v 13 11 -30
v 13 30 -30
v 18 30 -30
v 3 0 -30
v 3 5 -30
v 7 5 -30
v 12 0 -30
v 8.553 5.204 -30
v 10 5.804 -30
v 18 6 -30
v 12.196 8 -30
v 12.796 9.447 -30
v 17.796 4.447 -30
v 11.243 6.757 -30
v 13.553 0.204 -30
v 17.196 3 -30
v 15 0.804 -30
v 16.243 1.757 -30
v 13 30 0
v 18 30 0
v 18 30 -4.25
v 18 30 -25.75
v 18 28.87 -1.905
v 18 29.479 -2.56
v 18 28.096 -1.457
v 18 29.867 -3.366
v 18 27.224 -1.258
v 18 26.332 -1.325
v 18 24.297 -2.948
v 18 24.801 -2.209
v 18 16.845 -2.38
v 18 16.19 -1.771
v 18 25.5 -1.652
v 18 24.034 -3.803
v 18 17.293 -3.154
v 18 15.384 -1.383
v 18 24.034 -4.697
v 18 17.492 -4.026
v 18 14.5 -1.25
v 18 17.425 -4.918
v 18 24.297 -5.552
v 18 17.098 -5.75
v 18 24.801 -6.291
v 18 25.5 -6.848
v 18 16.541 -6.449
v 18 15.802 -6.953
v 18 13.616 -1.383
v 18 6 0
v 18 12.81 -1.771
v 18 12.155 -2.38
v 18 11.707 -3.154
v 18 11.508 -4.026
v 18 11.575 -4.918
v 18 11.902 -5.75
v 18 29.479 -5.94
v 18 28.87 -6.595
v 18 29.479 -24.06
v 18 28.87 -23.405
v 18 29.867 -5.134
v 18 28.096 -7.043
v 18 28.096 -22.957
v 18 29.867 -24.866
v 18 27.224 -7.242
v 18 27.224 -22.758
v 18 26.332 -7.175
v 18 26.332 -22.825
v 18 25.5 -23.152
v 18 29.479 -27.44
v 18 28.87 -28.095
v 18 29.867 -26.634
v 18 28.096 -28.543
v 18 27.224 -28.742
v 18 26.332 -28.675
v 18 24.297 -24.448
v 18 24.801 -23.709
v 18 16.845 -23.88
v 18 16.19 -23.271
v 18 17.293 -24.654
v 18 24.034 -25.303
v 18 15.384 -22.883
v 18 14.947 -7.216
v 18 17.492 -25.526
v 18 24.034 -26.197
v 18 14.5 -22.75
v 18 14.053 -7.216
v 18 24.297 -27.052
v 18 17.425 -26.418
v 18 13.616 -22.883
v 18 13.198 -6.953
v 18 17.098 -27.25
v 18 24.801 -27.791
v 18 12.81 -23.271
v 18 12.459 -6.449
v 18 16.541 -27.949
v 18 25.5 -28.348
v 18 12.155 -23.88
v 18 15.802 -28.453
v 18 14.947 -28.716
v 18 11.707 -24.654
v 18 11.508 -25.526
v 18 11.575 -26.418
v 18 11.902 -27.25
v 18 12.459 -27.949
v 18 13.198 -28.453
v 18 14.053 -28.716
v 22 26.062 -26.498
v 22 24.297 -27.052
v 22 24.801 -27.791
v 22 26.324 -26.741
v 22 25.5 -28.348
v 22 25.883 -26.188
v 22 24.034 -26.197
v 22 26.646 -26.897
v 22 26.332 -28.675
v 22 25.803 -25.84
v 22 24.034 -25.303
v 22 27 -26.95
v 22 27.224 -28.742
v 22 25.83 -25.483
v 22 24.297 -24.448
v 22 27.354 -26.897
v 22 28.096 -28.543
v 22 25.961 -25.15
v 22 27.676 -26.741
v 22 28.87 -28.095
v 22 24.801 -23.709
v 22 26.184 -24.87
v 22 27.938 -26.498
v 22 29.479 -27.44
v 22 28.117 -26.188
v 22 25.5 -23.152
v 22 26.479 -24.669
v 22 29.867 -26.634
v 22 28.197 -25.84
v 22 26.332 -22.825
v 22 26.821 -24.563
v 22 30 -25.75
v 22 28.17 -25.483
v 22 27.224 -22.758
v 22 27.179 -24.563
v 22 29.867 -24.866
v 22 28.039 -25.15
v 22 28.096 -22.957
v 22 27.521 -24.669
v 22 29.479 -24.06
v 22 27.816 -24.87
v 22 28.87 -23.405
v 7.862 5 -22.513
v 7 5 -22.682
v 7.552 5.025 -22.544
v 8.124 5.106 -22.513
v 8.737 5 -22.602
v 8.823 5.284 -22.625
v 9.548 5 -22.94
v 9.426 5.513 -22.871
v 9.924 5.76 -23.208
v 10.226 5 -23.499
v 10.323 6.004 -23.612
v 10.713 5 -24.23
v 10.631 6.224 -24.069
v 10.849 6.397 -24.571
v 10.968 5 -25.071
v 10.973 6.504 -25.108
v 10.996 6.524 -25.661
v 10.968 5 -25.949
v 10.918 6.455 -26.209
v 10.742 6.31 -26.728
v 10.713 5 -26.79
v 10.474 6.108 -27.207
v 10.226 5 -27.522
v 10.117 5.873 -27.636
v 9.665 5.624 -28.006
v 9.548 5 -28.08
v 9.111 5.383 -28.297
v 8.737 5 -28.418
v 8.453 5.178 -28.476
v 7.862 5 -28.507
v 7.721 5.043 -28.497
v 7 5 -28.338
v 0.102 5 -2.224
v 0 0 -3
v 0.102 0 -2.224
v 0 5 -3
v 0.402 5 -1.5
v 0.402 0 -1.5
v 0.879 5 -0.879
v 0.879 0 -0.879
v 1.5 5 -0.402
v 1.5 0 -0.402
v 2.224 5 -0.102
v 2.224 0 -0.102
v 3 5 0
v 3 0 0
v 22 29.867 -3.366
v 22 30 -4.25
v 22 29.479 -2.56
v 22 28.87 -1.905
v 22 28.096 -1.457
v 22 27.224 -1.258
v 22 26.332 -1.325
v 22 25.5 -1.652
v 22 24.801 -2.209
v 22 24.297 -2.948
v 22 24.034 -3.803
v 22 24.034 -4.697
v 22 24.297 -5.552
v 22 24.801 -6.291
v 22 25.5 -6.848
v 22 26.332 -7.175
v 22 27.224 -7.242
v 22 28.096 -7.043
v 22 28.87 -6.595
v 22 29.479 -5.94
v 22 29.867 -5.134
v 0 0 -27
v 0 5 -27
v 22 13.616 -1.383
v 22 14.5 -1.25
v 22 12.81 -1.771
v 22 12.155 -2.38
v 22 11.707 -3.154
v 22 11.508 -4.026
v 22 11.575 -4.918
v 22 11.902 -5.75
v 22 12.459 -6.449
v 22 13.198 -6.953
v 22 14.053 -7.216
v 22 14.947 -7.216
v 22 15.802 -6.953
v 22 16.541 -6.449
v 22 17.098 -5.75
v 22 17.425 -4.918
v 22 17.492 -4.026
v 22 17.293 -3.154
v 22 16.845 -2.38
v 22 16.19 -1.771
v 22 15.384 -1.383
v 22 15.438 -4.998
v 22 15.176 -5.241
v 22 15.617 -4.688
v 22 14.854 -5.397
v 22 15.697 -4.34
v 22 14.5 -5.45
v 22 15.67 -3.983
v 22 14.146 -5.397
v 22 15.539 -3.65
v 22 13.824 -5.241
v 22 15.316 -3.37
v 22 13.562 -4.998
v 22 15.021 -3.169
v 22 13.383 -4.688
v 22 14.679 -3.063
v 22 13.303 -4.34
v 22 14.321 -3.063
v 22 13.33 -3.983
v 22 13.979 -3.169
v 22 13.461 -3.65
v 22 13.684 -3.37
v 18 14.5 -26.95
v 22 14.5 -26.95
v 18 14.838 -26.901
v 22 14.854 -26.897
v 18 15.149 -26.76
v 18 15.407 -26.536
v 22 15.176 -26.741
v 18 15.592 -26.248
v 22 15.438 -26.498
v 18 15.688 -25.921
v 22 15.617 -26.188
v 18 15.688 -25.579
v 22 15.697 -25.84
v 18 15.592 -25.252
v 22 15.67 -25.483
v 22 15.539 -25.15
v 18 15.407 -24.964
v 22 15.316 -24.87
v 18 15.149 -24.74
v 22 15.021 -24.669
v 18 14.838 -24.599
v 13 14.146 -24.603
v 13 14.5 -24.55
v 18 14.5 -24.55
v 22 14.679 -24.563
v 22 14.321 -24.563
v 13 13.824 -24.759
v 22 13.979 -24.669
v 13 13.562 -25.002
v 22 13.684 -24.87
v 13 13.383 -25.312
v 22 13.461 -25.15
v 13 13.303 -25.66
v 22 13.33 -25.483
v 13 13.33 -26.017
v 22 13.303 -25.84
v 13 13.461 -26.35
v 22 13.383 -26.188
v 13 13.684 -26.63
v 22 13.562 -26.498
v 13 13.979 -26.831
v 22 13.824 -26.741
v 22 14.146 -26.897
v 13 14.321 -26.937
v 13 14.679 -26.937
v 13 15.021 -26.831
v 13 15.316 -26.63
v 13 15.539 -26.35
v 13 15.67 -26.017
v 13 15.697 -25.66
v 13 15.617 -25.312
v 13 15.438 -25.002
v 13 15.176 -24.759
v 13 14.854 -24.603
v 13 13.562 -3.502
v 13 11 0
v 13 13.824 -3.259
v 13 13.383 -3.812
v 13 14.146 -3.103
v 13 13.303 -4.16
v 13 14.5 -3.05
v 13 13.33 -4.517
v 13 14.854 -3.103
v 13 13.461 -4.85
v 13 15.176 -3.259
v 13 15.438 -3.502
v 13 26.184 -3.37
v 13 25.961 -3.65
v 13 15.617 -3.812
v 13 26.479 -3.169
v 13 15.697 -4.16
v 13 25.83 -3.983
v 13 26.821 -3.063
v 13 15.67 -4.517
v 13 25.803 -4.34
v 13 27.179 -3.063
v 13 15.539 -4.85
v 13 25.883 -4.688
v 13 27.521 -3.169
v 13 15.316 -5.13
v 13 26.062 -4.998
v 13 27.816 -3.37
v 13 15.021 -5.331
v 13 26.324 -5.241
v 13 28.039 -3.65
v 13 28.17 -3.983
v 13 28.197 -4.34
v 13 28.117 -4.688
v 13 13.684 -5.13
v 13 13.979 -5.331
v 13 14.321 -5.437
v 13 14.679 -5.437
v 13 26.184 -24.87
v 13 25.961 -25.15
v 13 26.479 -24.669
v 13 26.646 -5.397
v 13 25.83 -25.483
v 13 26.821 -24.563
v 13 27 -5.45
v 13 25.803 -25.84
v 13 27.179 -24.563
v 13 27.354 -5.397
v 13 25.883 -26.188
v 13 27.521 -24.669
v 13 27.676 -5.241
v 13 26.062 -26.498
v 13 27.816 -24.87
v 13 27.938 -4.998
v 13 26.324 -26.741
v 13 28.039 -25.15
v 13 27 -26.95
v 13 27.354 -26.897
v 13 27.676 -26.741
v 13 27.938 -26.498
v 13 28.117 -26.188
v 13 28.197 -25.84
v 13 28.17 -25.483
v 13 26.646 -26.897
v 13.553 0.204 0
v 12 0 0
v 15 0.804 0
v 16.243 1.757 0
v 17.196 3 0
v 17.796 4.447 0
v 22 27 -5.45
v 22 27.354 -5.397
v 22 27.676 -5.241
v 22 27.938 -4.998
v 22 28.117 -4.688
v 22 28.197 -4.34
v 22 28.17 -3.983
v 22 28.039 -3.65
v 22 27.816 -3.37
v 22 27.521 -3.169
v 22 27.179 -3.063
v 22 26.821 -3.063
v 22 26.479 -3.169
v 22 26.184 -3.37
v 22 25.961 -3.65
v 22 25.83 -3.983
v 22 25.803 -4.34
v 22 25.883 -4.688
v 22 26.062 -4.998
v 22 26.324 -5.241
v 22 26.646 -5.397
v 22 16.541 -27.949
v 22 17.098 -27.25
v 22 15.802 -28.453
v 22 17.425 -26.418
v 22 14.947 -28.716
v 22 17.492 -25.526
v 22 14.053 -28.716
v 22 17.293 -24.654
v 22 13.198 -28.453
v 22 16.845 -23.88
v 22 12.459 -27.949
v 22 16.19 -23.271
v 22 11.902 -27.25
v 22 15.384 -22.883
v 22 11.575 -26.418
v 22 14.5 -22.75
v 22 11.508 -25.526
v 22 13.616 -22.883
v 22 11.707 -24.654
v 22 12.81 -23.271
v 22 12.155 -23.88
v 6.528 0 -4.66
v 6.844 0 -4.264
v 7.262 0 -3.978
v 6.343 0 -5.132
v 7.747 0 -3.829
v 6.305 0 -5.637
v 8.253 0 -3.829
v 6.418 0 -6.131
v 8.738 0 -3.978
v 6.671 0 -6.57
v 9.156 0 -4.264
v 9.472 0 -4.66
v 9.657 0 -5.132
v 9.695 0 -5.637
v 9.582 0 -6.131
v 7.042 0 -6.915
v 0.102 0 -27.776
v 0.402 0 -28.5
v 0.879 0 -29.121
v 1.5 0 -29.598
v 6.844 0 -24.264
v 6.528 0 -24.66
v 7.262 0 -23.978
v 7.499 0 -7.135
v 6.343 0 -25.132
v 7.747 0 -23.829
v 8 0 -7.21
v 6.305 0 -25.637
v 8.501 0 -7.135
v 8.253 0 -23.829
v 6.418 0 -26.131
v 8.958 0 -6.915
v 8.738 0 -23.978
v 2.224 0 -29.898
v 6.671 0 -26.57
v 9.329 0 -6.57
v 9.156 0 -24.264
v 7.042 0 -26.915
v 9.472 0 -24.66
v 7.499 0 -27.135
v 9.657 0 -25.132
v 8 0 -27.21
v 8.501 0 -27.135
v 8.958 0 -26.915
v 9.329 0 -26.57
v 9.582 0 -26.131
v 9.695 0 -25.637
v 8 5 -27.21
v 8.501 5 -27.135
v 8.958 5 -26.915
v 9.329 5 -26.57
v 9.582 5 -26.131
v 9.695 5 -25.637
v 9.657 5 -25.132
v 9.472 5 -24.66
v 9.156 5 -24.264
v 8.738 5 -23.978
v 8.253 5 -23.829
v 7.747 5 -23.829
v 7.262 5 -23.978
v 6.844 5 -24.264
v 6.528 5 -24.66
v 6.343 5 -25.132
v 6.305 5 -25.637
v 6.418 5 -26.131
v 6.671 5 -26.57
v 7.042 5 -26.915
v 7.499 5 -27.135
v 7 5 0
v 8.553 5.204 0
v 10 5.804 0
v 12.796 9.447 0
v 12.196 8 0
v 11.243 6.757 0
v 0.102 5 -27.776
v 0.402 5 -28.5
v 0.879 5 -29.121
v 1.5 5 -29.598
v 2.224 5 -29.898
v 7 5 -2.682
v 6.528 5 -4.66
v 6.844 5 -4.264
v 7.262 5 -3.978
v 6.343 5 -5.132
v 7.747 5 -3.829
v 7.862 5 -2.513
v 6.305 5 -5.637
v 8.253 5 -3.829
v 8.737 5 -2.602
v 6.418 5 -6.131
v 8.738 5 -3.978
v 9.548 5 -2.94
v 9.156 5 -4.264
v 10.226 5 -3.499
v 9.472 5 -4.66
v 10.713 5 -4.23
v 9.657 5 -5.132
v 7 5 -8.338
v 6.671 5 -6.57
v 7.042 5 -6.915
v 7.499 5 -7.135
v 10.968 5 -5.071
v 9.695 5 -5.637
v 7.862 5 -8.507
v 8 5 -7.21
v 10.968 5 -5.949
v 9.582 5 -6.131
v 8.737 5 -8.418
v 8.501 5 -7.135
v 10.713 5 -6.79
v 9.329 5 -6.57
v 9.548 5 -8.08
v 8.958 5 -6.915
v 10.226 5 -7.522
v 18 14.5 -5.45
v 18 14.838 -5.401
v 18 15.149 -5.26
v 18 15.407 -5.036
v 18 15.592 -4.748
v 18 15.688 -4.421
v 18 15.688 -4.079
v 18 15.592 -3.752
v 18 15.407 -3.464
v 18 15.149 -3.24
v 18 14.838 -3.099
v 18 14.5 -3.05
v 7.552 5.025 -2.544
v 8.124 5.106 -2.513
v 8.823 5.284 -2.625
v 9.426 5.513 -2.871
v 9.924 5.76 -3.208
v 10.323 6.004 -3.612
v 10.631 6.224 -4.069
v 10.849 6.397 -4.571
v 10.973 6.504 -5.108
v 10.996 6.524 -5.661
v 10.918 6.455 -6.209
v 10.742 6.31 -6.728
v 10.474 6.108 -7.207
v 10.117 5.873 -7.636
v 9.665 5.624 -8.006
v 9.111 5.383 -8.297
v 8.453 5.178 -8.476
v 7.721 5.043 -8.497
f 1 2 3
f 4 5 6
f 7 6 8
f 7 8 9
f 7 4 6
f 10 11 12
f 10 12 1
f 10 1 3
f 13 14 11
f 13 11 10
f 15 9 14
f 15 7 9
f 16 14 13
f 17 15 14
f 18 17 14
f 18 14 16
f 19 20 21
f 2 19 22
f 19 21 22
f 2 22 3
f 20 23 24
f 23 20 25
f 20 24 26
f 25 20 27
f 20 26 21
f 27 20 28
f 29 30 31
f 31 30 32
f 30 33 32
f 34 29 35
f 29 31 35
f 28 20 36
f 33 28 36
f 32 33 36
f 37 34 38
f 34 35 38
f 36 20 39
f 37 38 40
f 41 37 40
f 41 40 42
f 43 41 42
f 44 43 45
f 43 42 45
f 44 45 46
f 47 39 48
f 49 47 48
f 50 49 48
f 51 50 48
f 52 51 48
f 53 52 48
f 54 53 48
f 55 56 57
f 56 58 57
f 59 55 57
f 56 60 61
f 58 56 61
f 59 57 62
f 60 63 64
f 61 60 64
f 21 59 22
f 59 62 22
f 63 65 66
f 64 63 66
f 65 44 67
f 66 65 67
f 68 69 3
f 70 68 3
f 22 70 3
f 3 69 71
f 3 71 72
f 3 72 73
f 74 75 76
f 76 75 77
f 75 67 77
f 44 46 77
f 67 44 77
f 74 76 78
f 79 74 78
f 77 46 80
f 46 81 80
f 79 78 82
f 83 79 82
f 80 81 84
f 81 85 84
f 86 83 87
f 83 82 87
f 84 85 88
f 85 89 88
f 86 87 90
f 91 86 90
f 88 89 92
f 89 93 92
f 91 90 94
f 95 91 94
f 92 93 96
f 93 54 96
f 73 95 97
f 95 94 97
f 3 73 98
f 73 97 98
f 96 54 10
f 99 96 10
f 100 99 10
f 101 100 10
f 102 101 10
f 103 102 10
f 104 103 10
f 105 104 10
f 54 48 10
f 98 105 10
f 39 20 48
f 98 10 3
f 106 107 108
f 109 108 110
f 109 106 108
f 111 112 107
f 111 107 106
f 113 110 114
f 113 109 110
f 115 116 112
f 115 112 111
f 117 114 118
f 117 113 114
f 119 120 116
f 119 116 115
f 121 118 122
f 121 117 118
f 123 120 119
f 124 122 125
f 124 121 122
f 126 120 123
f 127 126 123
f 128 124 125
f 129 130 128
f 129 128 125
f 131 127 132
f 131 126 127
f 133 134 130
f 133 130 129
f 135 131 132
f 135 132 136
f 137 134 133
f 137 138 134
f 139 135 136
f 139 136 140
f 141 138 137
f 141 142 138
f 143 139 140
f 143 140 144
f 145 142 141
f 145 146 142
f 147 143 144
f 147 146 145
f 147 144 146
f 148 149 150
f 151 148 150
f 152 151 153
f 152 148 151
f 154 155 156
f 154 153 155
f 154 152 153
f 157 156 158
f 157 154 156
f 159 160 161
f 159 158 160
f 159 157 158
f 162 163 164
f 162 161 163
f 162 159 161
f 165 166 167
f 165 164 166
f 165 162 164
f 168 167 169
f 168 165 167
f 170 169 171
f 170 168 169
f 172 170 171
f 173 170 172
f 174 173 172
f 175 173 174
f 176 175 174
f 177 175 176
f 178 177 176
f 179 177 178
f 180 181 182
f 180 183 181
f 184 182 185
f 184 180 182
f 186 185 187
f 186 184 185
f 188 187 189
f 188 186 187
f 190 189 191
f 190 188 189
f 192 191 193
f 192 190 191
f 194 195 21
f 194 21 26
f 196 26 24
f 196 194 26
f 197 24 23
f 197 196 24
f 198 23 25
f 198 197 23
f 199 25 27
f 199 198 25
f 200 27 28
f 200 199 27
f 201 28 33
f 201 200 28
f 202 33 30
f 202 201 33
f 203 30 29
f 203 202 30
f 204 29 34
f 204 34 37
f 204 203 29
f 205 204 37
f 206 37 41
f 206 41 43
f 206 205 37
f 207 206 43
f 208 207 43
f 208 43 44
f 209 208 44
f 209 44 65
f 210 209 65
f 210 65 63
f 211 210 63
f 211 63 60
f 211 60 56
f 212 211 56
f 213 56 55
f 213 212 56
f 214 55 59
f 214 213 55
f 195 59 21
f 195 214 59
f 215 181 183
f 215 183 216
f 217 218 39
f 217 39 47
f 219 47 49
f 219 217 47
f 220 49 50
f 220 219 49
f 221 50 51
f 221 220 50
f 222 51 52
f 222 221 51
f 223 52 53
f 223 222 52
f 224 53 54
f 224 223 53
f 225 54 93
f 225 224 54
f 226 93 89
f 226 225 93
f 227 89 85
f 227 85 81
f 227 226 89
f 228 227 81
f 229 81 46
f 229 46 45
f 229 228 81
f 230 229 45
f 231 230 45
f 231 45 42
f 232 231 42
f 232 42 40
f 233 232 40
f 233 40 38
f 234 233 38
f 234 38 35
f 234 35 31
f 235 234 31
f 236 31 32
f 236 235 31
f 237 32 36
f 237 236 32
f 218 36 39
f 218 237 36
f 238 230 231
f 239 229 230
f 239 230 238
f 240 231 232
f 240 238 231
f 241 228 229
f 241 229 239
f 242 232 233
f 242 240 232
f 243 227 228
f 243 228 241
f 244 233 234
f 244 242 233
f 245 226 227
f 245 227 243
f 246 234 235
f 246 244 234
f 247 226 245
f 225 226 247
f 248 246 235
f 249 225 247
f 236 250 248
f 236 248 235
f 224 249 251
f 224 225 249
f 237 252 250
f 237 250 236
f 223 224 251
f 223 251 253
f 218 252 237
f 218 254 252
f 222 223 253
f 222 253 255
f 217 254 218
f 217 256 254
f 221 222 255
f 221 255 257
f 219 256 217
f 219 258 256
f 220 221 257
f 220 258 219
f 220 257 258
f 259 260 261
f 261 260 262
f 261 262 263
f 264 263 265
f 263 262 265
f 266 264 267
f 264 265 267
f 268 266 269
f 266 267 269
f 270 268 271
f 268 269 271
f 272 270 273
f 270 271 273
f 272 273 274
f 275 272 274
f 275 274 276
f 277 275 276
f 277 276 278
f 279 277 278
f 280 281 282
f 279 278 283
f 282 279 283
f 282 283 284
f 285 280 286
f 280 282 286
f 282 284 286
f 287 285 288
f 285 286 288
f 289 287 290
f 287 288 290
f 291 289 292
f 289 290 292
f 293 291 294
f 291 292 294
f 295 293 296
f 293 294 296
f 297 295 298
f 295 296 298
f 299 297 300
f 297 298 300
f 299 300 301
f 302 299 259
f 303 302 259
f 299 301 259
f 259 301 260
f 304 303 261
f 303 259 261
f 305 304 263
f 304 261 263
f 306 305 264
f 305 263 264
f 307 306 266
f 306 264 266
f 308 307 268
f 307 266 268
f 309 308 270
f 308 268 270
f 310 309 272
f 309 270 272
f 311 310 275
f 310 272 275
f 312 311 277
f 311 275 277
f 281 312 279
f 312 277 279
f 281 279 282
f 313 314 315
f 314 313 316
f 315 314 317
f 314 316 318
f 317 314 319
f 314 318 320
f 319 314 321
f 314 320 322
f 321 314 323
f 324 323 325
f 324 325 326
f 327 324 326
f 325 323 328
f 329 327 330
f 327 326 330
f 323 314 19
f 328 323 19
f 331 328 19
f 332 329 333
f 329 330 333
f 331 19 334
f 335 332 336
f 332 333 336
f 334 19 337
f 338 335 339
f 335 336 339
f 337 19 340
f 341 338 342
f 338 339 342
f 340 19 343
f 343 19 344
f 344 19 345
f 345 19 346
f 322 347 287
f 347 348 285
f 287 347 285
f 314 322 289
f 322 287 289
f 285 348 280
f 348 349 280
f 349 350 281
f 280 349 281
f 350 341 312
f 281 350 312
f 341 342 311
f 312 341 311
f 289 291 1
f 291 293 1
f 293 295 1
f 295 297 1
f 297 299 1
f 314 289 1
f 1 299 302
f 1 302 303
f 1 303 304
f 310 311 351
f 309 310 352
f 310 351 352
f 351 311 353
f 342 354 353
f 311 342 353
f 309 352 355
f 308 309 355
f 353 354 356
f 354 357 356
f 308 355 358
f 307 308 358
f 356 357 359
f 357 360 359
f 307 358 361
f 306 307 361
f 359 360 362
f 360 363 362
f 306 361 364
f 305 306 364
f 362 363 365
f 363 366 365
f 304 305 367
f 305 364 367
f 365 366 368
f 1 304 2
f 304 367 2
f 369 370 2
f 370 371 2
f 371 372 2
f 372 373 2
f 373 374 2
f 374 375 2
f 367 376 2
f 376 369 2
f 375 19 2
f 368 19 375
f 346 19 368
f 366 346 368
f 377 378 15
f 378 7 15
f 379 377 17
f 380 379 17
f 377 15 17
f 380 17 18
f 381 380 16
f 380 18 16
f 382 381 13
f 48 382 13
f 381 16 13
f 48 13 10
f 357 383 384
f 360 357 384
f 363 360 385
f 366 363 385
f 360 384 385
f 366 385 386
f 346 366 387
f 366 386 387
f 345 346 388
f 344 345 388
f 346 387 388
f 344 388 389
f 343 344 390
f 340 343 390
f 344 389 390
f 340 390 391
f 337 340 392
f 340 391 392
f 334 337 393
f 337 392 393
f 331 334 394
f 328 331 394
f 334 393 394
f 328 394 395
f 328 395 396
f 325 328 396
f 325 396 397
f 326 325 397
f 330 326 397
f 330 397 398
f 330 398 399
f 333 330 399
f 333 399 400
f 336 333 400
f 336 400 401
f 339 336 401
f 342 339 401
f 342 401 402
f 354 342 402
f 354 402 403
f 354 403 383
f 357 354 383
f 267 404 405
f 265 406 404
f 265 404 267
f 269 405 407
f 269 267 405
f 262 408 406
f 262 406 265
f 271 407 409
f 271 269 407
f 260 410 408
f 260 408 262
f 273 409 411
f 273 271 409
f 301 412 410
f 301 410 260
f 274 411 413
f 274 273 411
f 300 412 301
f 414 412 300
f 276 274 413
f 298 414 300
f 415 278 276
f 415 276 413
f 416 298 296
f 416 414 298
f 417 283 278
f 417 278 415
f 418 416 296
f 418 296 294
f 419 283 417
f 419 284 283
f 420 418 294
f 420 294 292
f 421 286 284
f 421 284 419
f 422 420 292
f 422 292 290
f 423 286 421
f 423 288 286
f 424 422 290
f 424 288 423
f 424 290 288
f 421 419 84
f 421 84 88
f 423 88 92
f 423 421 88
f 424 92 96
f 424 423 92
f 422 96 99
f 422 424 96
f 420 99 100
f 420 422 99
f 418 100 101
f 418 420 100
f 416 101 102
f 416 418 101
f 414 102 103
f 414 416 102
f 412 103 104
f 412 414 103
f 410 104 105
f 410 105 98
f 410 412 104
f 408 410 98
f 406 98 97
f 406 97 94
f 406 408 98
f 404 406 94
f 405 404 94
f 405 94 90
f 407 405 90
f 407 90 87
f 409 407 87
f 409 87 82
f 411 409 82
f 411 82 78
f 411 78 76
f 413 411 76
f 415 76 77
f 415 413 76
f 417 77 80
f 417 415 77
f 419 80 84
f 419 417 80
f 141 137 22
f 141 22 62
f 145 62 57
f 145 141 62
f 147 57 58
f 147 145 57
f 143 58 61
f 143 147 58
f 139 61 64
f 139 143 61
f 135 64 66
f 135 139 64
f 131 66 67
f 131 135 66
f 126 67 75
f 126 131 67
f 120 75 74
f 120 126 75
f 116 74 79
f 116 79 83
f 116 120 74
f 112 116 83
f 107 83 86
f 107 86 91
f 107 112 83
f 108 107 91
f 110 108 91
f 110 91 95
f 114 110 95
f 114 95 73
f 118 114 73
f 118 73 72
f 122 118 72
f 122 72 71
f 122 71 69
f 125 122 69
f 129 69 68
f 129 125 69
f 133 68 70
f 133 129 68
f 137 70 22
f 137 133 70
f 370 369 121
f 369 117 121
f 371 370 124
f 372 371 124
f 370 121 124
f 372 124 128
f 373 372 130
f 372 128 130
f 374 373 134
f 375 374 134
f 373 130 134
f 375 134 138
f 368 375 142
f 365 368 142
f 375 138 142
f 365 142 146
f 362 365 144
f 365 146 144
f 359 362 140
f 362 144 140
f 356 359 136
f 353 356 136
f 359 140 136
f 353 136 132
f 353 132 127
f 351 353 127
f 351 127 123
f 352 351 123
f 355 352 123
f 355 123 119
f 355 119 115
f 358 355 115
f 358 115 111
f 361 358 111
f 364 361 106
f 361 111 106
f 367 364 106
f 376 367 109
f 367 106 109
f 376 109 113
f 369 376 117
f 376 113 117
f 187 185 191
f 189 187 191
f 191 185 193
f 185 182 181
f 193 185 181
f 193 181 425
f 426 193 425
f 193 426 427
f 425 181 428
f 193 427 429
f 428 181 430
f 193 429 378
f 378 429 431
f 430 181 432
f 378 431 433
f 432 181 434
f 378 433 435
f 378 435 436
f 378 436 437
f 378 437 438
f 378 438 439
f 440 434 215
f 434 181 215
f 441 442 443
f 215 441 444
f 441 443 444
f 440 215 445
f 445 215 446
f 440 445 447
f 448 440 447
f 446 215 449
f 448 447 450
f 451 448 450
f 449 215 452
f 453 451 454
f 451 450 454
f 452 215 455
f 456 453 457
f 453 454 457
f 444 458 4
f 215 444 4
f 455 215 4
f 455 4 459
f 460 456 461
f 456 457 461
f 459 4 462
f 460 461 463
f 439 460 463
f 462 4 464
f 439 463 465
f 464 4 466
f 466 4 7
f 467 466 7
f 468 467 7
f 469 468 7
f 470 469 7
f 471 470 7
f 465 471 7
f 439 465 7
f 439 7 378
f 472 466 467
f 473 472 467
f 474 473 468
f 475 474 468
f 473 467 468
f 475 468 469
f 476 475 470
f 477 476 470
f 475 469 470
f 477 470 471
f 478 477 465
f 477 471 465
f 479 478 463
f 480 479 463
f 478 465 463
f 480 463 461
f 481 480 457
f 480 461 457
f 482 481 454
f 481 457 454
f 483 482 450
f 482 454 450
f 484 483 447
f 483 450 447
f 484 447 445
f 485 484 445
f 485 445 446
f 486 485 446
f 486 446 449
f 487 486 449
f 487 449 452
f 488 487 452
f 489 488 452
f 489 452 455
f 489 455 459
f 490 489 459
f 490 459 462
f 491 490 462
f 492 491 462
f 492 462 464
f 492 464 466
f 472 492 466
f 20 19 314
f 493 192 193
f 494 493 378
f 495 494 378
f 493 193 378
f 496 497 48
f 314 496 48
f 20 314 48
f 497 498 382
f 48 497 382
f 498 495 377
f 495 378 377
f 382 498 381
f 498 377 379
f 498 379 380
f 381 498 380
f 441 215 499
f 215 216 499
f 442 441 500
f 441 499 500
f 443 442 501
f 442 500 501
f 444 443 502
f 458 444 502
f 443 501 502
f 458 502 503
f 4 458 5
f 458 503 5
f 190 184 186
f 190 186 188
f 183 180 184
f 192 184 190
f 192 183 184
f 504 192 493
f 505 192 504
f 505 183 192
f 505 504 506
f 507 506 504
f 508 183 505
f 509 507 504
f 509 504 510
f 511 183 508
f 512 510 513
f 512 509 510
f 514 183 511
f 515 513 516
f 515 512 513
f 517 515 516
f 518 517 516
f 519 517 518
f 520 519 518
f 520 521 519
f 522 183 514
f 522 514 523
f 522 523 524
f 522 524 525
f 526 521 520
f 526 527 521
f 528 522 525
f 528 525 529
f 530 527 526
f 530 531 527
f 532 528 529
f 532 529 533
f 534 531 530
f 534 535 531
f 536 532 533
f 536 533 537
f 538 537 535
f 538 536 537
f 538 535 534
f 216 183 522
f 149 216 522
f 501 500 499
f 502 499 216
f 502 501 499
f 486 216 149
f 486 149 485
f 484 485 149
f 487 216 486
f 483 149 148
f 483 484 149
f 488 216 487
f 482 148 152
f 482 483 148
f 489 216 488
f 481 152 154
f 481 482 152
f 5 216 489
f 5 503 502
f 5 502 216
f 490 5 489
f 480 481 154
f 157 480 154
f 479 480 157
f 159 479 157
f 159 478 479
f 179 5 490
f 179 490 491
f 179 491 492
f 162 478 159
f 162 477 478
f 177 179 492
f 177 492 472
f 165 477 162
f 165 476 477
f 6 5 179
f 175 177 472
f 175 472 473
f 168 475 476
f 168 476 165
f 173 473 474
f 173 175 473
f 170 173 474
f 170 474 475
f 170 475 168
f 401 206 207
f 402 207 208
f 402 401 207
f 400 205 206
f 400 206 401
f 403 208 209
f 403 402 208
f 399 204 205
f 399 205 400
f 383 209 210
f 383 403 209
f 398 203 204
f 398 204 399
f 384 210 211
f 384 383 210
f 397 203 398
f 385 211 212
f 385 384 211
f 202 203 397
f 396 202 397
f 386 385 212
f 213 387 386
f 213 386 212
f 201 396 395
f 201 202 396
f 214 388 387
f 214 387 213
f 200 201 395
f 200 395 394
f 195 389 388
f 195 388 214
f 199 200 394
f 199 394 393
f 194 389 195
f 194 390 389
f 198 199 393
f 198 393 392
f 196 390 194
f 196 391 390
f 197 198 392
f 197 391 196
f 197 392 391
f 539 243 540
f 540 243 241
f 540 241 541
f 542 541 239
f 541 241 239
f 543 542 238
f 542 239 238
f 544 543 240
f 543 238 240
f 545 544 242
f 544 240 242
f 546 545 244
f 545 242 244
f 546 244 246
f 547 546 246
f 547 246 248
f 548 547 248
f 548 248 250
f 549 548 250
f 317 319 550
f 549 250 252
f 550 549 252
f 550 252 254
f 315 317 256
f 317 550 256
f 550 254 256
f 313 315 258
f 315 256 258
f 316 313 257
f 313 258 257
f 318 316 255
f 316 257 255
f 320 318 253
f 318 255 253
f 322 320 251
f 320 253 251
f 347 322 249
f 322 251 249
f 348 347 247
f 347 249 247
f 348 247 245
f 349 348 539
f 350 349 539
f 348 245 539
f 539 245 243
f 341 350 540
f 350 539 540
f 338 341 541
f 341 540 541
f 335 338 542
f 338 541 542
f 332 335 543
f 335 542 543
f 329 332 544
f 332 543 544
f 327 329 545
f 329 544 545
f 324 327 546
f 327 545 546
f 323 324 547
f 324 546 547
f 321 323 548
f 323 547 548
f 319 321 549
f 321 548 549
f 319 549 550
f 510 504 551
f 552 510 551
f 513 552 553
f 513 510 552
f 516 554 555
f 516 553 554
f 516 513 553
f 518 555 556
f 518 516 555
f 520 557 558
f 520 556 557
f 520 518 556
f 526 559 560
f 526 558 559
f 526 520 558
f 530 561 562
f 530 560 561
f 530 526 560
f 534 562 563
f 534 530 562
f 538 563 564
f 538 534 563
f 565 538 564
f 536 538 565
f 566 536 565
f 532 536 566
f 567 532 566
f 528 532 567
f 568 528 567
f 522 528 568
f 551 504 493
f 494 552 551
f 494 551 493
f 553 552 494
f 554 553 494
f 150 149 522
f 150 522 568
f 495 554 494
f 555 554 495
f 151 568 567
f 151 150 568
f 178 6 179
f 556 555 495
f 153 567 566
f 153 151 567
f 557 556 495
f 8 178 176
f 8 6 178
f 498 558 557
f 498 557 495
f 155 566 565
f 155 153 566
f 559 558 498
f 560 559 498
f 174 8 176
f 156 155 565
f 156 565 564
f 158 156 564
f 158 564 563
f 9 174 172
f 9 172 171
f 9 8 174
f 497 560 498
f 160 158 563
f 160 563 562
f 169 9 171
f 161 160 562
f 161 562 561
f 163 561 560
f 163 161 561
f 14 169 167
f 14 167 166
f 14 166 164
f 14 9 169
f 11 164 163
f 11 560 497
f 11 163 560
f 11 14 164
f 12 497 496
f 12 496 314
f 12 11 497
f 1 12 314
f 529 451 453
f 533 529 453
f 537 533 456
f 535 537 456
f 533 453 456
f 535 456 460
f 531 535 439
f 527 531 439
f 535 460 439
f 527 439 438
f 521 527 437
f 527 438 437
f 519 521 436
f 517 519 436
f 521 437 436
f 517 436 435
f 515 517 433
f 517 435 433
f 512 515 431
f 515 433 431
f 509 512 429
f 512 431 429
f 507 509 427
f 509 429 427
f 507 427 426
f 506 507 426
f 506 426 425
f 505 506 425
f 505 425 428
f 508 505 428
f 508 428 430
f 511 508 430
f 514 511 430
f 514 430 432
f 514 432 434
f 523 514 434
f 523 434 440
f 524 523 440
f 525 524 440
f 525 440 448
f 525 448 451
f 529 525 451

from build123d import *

# Parameters (mm, degrees)
SKETCH1_W           = 18
SKETCH1_H           = 30
BOSS_EXTRUDE1_DEPTH = 5
SKETCH2_W           = 30
SKETCH2_H           = 30
BOSS_EXTRUDE2_DEPTH = 5
SKETCH3_R           = 1.2
CUT_EXTRUDE1_DEPTH  = 5
FILLET1_R           = 6
BOSS_EXTRUDE3_START = 4
SKETCH4_R           = 3
SKETCH4_R_2         = 1.2
BOSS_EXTRUDE3_DEPTH = 4
SKETCH5_R           = 1.7
CUT_EXTRUDE2_DEPTH  = 24
SKETCH6_R           = 3
CUT_EXTRUDE3_DEPTH  = 24
FILLET2_R           = 3


with BuildPart() as part:
    # Sketch1 → Boss-Extrude1 (new body)
    with BuildSketch(Plane(origin=(0, 0, 0), x_dir=(1, 0, 0), z_dir=(0, 1, 0))):
        with Locations((9, 15)):
            Rectangle(SKETCH1_W, SKETCH1_H)
    extrude(amount=BOSS_EXTRUDE1_DEPTH)

    # Sketch2 → Boss-Extrude2 (add)
    with BuildSketch(Plane(origin=(18, 0, 0), x_dir=(0, 0, -1), z_dir=(1, 0, 0))):
        with Locations((15, 15)):
            Rectangle(SKETCH2_W, SKETCH2_H)
    extrude(amount=-BOSS_EXTRUDE2_DEPTH)

    # Sketch3 → Cut-Extrude1 (cut)
    with BuildSketch(Plane(origin=(18, 0, 0), x_dir=(0, 0, -1), z_dir=(1, 0, 0))):
        with Locations((4.25, 27)):
            Circle(SKETCH3_R)
        with Locations((25.75, 27)):
            Circle(SKETCH3_R)
        with Locations(Location((25.75, 14.5, 0), (0, 0, 180))):
            Circle(SKETCH3_R)
        with Locations(Location((4.25, 14.5, 0), (0, 0, 180))):
            Circle(SKETCH3_R)
    extrude(amount=-CUT_EXTRUDE1_DEPTH, mode=Mode.SUBTRACT)

    # Fillet1
    fillet1_edges = [part.edges().sort_by_distance(p)[0] for p in [
        (13, 5, -15),
        (18, 0, -15),
    ]]
    fillet(fillet1_edges, radius=FILLET1_R)

    # Sketch4 → Boss-Extrude3 (add)
    # profile 1 of 4: a face of its own
    with BuildSketch(Plane(origin=(18, 0, 0), x_dir=(0, 0, -1), z_dir=(1, 0, 0)).offset(BOSS_EXTRUDE3_START)):
        with Locations(Location((4.25, 27, 0), (0, 0, 90))):
            Circle(SKETCH4_R)
        with Locations((4.25, 27)):
            Circle(SKETCH4_R_2, mode=Mode.SUBTRACT)
    # profile 2 of 4: a face of its own
    with BuildSketch(Plane(origin=(18, 0, 0), x_dir=(0, 0, -1), z_dir=(1, 0, 0)).offset(BOSS_EXTRUDE3_START)):
        with Locations(Location((25.75, 27, 0), (0, 0, 90))):
            Circle(SKETCH4_R)
        with Locations((25.75, 27)):
            Circle(SKETCH4_R_2, mode=Mode.SUBTRACT)
    # profile 3 of 4: a face of its own
    with BuildSketch(Plane(origin=(18, 0, 0), x_dir=(0, 0, -1), z_dir=(1, 0, 0)).offset(BOSS_EXTRUDE3_START)):
        with Locations(Location((4.25, 14.5, 0), (0, 0, 180))):
            Circle(SKETCH4_R)
        with Locations((4.25, 14.5)):
            Circle(SKETCH4_R_2, mode=Mode.SUBTRACT)
    # profile 4 of 4: a face of its own
    with BuildSketch(Plane(origin=(18, 0, 0), x_dir=(0, 0, -1), z_dir=(1, 0, 0)).offset(BOSS_EXTRUDE3_START)):
        with Locations(Location((25.75, 14.5, 0), (0, 0, 180))):
            Circle(SKETCH4_R)
        with Locations((25.75, 14.5)):
            Circle(SKETCH4_R_2, mode=Mode.SUBTRACT)
    extrude(amount=-BOSS_EXTRUDE3_DEPTH)

    # Sketch5 → Cut-Extrude2 (cut)
    with BuildSketch(Plane.XZ):
        with Locations(Location((8, -5.510071499, 0), (0, 0, 270))):
            Circle(SKETCH5_R)
        with Locations(Location((8, -25.510071499, 0), (0, 0, 270))):
            Circle(SKETCH5_R)
    extrude(amount=-CUT_EXTRUDE2_DEPTH, mode=Mode.SUBTRACT)

    # Sketch6 → Cut-Extrude3 (cut)
    with BuildSketch(Plane(origin=(0, 5, 0), x_dir=(1, 0, 0), z_dir=(0, 1, 0))):
        with Locations((8, 25.510071499)):
            Circle(SKETCH6_R)
        with Locations((8, 5.510071499)):
            Circle(SKETCH6_R)
    extrude(amount=CUT_EXTRUDE3_DEPTH, mode=Mode.SUBTRACT)

    # Fillet2
    fillet2_edges = [part.edges().sort_by_distance(p)[0] for p in [
        (0, 2.5, -30),
        (0, 2.5, 0),
    ]]
    fillet(fillet2_edges, radius=FILLET2_R)


solid = part.part
